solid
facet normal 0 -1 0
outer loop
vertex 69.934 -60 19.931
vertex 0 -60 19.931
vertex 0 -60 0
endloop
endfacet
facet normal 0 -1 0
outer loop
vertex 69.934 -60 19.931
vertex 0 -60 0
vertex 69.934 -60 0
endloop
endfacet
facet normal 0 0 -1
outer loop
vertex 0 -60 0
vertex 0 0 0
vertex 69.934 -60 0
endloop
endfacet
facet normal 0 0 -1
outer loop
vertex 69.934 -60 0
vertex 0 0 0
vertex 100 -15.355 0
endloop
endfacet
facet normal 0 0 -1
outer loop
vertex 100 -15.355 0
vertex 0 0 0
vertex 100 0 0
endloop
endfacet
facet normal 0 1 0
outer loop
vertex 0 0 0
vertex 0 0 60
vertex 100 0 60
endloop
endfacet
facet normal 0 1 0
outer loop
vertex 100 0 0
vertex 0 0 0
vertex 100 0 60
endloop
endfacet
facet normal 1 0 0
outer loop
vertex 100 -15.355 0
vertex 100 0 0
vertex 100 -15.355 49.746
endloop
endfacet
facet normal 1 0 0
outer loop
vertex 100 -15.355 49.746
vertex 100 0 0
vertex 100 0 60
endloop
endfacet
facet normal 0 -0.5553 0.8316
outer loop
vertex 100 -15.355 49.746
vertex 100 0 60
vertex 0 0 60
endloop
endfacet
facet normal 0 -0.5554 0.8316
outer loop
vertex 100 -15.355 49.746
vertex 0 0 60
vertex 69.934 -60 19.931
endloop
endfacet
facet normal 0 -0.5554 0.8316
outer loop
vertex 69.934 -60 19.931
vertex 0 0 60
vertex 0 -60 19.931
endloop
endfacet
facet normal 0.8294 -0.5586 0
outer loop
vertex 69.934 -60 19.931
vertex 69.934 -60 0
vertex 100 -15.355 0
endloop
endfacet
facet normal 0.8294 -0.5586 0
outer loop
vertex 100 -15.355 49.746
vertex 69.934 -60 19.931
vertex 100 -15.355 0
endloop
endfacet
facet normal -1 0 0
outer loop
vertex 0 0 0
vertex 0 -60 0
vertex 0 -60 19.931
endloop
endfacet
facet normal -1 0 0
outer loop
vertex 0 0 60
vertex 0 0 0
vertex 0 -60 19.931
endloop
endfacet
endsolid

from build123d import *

# Parameters (mm, degrees)
F0_W     = 100
F0_H     = 60
F1_DEPTH = 60
F3_DEPTH = 100
F5_DEPTH = 73.8


with BuildPart() as f1:
    # F0 (on Front) → F1 (new body)
    with BuildSketch(Plane.XZ):
        with Locations((50, 30)):
            Rectangle(F0_W, F0_H)
    extrude(amount=F1_DEPTH)

    # F2 (on face) → F3 (cut)
    with BuildSketch(Plane(origin=(0, 0, 0), x_dir=(0, -1, 0), z_dir=(-1, 0, 0))):
        Polygon((0, 60), (60, 19.930851), (60, 60), align=None)
    extrude(amount=-F3_DEPTH, mode=Mode.SUBTRACT)

    # F4 (on face) → F5 (cut)
    with BuildSketch(Plane(origin=(0, 0, 0), x_dir=(1, 0, 0), z_dir=(0, 0, -1))):
        Polygon((100, 60), (69.933802, 60), (100, 15.354728), align=None)
    extrude(amount=-F5_DEPTH, mode=Mode.SUBTRACT)


solid = f1.part
